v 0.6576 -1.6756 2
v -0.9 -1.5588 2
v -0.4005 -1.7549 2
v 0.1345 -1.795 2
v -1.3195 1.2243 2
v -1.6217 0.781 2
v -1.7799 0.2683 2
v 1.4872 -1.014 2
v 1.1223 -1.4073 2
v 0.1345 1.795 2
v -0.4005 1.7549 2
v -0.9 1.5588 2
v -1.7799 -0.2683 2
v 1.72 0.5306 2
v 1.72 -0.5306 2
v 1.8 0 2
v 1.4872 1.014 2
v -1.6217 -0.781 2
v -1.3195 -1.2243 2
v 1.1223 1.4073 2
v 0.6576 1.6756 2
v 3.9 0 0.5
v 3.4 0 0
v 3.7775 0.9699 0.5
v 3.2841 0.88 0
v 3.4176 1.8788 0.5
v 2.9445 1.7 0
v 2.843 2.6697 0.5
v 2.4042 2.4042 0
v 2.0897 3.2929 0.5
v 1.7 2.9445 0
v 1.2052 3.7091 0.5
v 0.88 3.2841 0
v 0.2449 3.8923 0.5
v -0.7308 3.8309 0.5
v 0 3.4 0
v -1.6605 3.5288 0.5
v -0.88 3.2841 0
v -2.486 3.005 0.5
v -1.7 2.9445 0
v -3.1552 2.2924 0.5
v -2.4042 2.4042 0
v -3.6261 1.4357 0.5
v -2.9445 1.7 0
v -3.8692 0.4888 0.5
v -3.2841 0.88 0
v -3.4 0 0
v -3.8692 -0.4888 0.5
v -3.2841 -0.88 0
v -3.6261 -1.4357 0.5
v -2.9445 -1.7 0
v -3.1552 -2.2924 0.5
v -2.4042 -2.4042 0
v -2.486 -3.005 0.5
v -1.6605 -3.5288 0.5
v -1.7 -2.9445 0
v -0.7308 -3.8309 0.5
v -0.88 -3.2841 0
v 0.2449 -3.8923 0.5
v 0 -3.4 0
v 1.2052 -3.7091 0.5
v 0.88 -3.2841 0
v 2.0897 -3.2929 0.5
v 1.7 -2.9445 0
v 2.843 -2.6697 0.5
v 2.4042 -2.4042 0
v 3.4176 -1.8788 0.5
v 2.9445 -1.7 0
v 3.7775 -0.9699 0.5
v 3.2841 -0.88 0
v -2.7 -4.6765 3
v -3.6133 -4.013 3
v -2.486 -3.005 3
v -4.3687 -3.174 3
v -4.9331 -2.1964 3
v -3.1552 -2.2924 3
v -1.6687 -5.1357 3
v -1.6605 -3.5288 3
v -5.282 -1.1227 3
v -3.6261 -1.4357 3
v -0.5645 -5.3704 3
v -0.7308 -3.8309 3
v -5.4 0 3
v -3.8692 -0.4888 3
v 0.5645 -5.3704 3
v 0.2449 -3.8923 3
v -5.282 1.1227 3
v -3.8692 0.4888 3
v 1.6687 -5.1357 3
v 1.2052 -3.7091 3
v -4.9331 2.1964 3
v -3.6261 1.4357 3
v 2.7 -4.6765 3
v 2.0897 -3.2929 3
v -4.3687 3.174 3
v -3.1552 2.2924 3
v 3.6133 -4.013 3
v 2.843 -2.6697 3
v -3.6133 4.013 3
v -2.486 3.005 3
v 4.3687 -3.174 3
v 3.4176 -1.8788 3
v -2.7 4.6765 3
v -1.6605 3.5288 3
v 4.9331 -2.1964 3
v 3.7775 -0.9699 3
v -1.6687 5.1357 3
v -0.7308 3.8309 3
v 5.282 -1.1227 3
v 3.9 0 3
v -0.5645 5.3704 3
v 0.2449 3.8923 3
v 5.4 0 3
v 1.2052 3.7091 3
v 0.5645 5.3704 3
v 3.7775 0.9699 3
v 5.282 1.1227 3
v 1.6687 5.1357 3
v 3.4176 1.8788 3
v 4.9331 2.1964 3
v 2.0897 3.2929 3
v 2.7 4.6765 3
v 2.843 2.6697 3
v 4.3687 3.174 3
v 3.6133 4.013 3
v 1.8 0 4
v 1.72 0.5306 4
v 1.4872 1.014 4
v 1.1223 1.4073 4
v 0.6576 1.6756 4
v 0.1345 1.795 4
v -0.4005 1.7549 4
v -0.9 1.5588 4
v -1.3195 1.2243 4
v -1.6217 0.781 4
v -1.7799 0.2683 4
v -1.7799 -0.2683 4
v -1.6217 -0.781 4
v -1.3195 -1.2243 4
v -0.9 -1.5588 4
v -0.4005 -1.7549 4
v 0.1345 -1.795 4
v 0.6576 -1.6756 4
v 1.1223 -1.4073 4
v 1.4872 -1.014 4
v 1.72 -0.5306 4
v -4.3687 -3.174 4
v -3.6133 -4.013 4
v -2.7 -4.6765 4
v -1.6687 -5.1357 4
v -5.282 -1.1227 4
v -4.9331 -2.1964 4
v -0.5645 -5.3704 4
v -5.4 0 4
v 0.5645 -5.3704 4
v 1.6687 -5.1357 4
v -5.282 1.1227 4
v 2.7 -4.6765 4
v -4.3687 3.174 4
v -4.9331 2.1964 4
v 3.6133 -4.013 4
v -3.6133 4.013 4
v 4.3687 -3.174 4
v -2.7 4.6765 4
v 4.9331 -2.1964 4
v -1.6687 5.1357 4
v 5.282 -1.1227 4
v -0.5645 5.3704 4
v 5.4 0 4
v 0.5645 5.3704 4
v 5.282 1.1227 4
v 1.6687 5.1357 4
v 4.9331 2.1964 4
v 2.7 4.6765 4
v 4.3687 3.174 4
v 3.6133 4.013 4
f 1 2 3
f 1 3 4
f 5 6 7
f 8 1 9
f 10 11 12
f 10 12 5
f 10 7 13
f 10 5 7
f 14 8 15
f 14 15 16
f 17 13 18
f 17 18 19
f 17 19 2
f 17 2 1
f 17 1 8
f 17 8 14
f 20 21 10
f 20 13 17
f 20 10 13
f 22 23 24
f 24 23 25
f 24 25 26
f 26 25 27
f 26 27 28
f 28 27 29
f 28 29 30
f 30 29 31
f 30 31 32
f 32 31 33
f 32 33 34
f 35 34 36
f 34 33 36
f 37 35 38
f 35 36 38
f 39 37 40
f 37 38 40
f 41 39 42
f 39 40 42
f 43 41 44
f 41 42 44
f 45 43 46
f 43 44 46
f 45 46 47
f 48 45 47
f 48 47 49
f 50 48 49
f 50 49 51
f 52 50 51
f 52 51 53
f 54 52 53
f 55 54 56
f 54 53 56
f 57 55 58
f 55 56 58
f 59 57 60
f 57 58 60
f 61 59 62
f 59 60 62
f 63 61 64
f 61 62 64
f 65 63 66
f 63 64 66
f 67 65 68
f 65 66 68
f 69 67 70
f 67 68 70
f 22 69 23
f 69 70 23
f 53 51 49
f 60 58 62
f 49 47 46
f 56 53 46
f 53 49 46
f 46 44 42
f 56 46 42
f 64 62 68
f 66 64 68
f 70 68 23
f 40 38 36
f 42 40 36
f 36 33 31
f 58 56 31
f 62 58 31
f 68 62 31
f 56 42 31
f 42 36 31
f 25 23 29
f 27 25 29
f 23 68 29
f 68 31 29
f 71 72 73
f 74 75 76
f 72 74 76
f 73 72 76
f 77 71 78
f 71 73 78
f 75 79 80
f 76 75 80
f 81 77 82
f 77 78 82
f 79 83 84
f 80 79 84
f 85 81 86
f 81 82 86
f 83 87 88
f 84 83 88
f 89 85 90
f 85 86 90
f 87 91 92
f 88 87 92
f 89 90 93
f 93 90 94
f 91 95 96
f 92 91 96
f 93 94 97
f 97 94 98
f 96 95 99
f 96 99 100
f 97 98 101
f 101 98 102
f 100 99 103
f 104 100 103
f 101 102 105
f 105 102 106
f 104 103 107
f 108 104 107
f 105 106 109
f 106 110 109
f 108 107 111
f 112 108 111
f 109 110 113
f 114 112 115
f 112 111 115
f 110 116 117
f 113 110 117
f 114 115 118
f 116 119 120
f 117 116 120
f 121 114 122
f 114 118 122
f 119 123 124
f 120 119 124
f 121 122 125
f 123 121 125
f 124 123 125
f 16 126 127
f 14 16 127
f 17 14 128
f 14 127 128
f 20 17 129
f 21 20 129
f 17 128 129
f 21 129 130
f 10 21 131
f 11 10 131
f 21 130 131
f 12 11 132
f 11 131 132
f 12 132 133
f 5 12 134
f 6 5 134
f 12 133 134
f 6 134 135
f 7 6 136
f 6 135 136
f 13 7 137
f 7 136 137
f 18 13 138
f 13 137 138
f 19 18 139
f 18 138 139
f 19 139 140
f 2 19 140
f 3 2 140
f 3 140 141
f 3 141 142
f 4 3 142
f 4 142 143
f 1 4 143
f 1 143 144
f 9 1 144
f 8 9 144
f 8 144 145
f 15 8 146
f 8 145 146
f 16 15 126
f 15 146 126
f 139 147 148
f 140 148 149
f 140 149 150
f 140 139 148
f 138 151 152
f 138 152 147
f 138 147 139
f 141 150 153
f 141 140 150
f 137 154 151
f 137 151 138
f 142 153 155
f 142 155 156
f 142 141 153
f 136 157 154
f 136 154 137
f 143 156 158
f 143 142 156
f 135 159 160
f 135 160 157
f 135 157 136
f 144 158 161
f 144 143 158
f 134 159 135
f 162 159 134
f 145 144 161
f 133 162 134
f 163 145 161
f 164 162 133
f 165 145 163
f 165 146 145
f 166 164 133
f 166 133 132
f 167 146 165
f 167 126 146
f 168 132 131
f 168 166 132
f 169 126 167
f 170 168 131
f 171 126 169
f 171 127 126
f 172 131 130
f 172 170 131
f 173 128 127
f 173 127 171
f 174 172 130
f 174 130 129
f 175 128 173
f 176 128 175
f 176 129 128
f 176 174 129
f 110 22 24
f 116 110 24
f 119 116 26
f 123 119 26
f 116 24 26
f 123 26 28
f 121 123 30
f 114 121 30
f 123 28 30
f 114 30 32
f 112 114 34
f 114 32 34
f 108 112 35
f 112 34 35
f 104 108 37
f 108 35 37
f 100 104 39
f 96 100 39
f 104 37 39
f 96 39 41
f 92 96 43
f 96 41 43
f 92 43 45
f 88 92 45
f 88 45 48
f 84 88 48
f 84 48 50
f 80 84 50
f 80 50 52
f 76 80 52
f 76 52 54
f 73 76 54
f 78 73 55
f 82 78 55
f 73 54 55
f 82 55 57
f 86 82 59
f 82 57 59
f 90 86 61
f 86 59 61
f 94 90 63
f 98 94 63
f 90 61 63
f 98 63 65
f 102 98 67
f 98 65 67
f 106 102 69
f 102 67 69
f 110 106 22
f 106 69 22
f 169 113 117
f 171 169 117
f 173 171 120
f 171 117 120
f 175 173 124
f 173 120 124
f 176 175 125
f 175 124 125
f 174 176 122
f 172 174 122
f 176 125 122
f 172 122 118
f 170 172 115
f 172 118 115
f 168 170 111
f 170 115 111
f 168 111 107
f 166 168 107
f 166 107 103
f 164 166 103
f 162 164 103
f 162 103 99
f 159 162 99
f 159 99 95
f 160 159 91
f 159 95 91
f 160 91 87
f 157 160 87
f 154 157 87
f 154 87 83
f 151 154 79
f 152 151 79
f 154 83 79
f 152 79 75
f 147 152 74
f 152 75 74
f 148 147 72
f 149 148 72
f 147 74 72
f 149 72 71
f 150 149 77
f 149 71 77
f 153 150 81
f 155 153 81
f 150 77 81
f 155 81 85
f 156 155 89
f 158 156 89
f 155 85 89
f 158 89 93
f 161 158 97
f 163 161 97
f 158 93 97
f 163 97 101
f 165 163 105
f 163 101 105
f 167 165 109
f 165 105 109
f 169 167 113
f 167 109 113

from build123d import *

# Parameters (mm, degrees)
SKETCH_1_R          = 3.9
EXTRUDE_1_DEPTH     = 3
CHAMFER_1_SIZE      = 0.5
SKETCH_4_R          = 5.4
EXTRUDE_2_DEPTH     = 1
SKETCH_5_R          = 1.8
CUT_EXTRUDE_2_DEPTH = 2


with BuildPart() as part:
    # Эскиз1 → Бобышка-Вытянуть1 (new body)
    with BuildSketch(Plane.XY):
        Circle(SKETCH_1_R)
    extrude(amount=EXTRUDE_1_DEPTH)

    # Фаска1
    chamfer_1_edges = [part.edges().sort_by_distance(p)[0] for p in [
        (-3.9, 0, 0),
    ]]
    chamfer(chamfer_1_edges, length=CHAMFER_1_SIZE)

    # Эскиз4 → Бобышка-Вытянуть2 (add)
    with BuildSketch(Plane.XY.offset(3)):
        Circle(SKETCH_4_R)
    extrude(amount=EXTRUDE_2_DEPTH)

    # Эскиз5 → Вырез-Вытянуть2 (cut)
    with BuildSketch(Plane.XY.offset(4)):
        Circle(SKETCH_5_R)
    extrude(amount=-CUT_EXTRUDE_2_DEPTH, mode=Mode.SUBTRACT)


solid = part.part
